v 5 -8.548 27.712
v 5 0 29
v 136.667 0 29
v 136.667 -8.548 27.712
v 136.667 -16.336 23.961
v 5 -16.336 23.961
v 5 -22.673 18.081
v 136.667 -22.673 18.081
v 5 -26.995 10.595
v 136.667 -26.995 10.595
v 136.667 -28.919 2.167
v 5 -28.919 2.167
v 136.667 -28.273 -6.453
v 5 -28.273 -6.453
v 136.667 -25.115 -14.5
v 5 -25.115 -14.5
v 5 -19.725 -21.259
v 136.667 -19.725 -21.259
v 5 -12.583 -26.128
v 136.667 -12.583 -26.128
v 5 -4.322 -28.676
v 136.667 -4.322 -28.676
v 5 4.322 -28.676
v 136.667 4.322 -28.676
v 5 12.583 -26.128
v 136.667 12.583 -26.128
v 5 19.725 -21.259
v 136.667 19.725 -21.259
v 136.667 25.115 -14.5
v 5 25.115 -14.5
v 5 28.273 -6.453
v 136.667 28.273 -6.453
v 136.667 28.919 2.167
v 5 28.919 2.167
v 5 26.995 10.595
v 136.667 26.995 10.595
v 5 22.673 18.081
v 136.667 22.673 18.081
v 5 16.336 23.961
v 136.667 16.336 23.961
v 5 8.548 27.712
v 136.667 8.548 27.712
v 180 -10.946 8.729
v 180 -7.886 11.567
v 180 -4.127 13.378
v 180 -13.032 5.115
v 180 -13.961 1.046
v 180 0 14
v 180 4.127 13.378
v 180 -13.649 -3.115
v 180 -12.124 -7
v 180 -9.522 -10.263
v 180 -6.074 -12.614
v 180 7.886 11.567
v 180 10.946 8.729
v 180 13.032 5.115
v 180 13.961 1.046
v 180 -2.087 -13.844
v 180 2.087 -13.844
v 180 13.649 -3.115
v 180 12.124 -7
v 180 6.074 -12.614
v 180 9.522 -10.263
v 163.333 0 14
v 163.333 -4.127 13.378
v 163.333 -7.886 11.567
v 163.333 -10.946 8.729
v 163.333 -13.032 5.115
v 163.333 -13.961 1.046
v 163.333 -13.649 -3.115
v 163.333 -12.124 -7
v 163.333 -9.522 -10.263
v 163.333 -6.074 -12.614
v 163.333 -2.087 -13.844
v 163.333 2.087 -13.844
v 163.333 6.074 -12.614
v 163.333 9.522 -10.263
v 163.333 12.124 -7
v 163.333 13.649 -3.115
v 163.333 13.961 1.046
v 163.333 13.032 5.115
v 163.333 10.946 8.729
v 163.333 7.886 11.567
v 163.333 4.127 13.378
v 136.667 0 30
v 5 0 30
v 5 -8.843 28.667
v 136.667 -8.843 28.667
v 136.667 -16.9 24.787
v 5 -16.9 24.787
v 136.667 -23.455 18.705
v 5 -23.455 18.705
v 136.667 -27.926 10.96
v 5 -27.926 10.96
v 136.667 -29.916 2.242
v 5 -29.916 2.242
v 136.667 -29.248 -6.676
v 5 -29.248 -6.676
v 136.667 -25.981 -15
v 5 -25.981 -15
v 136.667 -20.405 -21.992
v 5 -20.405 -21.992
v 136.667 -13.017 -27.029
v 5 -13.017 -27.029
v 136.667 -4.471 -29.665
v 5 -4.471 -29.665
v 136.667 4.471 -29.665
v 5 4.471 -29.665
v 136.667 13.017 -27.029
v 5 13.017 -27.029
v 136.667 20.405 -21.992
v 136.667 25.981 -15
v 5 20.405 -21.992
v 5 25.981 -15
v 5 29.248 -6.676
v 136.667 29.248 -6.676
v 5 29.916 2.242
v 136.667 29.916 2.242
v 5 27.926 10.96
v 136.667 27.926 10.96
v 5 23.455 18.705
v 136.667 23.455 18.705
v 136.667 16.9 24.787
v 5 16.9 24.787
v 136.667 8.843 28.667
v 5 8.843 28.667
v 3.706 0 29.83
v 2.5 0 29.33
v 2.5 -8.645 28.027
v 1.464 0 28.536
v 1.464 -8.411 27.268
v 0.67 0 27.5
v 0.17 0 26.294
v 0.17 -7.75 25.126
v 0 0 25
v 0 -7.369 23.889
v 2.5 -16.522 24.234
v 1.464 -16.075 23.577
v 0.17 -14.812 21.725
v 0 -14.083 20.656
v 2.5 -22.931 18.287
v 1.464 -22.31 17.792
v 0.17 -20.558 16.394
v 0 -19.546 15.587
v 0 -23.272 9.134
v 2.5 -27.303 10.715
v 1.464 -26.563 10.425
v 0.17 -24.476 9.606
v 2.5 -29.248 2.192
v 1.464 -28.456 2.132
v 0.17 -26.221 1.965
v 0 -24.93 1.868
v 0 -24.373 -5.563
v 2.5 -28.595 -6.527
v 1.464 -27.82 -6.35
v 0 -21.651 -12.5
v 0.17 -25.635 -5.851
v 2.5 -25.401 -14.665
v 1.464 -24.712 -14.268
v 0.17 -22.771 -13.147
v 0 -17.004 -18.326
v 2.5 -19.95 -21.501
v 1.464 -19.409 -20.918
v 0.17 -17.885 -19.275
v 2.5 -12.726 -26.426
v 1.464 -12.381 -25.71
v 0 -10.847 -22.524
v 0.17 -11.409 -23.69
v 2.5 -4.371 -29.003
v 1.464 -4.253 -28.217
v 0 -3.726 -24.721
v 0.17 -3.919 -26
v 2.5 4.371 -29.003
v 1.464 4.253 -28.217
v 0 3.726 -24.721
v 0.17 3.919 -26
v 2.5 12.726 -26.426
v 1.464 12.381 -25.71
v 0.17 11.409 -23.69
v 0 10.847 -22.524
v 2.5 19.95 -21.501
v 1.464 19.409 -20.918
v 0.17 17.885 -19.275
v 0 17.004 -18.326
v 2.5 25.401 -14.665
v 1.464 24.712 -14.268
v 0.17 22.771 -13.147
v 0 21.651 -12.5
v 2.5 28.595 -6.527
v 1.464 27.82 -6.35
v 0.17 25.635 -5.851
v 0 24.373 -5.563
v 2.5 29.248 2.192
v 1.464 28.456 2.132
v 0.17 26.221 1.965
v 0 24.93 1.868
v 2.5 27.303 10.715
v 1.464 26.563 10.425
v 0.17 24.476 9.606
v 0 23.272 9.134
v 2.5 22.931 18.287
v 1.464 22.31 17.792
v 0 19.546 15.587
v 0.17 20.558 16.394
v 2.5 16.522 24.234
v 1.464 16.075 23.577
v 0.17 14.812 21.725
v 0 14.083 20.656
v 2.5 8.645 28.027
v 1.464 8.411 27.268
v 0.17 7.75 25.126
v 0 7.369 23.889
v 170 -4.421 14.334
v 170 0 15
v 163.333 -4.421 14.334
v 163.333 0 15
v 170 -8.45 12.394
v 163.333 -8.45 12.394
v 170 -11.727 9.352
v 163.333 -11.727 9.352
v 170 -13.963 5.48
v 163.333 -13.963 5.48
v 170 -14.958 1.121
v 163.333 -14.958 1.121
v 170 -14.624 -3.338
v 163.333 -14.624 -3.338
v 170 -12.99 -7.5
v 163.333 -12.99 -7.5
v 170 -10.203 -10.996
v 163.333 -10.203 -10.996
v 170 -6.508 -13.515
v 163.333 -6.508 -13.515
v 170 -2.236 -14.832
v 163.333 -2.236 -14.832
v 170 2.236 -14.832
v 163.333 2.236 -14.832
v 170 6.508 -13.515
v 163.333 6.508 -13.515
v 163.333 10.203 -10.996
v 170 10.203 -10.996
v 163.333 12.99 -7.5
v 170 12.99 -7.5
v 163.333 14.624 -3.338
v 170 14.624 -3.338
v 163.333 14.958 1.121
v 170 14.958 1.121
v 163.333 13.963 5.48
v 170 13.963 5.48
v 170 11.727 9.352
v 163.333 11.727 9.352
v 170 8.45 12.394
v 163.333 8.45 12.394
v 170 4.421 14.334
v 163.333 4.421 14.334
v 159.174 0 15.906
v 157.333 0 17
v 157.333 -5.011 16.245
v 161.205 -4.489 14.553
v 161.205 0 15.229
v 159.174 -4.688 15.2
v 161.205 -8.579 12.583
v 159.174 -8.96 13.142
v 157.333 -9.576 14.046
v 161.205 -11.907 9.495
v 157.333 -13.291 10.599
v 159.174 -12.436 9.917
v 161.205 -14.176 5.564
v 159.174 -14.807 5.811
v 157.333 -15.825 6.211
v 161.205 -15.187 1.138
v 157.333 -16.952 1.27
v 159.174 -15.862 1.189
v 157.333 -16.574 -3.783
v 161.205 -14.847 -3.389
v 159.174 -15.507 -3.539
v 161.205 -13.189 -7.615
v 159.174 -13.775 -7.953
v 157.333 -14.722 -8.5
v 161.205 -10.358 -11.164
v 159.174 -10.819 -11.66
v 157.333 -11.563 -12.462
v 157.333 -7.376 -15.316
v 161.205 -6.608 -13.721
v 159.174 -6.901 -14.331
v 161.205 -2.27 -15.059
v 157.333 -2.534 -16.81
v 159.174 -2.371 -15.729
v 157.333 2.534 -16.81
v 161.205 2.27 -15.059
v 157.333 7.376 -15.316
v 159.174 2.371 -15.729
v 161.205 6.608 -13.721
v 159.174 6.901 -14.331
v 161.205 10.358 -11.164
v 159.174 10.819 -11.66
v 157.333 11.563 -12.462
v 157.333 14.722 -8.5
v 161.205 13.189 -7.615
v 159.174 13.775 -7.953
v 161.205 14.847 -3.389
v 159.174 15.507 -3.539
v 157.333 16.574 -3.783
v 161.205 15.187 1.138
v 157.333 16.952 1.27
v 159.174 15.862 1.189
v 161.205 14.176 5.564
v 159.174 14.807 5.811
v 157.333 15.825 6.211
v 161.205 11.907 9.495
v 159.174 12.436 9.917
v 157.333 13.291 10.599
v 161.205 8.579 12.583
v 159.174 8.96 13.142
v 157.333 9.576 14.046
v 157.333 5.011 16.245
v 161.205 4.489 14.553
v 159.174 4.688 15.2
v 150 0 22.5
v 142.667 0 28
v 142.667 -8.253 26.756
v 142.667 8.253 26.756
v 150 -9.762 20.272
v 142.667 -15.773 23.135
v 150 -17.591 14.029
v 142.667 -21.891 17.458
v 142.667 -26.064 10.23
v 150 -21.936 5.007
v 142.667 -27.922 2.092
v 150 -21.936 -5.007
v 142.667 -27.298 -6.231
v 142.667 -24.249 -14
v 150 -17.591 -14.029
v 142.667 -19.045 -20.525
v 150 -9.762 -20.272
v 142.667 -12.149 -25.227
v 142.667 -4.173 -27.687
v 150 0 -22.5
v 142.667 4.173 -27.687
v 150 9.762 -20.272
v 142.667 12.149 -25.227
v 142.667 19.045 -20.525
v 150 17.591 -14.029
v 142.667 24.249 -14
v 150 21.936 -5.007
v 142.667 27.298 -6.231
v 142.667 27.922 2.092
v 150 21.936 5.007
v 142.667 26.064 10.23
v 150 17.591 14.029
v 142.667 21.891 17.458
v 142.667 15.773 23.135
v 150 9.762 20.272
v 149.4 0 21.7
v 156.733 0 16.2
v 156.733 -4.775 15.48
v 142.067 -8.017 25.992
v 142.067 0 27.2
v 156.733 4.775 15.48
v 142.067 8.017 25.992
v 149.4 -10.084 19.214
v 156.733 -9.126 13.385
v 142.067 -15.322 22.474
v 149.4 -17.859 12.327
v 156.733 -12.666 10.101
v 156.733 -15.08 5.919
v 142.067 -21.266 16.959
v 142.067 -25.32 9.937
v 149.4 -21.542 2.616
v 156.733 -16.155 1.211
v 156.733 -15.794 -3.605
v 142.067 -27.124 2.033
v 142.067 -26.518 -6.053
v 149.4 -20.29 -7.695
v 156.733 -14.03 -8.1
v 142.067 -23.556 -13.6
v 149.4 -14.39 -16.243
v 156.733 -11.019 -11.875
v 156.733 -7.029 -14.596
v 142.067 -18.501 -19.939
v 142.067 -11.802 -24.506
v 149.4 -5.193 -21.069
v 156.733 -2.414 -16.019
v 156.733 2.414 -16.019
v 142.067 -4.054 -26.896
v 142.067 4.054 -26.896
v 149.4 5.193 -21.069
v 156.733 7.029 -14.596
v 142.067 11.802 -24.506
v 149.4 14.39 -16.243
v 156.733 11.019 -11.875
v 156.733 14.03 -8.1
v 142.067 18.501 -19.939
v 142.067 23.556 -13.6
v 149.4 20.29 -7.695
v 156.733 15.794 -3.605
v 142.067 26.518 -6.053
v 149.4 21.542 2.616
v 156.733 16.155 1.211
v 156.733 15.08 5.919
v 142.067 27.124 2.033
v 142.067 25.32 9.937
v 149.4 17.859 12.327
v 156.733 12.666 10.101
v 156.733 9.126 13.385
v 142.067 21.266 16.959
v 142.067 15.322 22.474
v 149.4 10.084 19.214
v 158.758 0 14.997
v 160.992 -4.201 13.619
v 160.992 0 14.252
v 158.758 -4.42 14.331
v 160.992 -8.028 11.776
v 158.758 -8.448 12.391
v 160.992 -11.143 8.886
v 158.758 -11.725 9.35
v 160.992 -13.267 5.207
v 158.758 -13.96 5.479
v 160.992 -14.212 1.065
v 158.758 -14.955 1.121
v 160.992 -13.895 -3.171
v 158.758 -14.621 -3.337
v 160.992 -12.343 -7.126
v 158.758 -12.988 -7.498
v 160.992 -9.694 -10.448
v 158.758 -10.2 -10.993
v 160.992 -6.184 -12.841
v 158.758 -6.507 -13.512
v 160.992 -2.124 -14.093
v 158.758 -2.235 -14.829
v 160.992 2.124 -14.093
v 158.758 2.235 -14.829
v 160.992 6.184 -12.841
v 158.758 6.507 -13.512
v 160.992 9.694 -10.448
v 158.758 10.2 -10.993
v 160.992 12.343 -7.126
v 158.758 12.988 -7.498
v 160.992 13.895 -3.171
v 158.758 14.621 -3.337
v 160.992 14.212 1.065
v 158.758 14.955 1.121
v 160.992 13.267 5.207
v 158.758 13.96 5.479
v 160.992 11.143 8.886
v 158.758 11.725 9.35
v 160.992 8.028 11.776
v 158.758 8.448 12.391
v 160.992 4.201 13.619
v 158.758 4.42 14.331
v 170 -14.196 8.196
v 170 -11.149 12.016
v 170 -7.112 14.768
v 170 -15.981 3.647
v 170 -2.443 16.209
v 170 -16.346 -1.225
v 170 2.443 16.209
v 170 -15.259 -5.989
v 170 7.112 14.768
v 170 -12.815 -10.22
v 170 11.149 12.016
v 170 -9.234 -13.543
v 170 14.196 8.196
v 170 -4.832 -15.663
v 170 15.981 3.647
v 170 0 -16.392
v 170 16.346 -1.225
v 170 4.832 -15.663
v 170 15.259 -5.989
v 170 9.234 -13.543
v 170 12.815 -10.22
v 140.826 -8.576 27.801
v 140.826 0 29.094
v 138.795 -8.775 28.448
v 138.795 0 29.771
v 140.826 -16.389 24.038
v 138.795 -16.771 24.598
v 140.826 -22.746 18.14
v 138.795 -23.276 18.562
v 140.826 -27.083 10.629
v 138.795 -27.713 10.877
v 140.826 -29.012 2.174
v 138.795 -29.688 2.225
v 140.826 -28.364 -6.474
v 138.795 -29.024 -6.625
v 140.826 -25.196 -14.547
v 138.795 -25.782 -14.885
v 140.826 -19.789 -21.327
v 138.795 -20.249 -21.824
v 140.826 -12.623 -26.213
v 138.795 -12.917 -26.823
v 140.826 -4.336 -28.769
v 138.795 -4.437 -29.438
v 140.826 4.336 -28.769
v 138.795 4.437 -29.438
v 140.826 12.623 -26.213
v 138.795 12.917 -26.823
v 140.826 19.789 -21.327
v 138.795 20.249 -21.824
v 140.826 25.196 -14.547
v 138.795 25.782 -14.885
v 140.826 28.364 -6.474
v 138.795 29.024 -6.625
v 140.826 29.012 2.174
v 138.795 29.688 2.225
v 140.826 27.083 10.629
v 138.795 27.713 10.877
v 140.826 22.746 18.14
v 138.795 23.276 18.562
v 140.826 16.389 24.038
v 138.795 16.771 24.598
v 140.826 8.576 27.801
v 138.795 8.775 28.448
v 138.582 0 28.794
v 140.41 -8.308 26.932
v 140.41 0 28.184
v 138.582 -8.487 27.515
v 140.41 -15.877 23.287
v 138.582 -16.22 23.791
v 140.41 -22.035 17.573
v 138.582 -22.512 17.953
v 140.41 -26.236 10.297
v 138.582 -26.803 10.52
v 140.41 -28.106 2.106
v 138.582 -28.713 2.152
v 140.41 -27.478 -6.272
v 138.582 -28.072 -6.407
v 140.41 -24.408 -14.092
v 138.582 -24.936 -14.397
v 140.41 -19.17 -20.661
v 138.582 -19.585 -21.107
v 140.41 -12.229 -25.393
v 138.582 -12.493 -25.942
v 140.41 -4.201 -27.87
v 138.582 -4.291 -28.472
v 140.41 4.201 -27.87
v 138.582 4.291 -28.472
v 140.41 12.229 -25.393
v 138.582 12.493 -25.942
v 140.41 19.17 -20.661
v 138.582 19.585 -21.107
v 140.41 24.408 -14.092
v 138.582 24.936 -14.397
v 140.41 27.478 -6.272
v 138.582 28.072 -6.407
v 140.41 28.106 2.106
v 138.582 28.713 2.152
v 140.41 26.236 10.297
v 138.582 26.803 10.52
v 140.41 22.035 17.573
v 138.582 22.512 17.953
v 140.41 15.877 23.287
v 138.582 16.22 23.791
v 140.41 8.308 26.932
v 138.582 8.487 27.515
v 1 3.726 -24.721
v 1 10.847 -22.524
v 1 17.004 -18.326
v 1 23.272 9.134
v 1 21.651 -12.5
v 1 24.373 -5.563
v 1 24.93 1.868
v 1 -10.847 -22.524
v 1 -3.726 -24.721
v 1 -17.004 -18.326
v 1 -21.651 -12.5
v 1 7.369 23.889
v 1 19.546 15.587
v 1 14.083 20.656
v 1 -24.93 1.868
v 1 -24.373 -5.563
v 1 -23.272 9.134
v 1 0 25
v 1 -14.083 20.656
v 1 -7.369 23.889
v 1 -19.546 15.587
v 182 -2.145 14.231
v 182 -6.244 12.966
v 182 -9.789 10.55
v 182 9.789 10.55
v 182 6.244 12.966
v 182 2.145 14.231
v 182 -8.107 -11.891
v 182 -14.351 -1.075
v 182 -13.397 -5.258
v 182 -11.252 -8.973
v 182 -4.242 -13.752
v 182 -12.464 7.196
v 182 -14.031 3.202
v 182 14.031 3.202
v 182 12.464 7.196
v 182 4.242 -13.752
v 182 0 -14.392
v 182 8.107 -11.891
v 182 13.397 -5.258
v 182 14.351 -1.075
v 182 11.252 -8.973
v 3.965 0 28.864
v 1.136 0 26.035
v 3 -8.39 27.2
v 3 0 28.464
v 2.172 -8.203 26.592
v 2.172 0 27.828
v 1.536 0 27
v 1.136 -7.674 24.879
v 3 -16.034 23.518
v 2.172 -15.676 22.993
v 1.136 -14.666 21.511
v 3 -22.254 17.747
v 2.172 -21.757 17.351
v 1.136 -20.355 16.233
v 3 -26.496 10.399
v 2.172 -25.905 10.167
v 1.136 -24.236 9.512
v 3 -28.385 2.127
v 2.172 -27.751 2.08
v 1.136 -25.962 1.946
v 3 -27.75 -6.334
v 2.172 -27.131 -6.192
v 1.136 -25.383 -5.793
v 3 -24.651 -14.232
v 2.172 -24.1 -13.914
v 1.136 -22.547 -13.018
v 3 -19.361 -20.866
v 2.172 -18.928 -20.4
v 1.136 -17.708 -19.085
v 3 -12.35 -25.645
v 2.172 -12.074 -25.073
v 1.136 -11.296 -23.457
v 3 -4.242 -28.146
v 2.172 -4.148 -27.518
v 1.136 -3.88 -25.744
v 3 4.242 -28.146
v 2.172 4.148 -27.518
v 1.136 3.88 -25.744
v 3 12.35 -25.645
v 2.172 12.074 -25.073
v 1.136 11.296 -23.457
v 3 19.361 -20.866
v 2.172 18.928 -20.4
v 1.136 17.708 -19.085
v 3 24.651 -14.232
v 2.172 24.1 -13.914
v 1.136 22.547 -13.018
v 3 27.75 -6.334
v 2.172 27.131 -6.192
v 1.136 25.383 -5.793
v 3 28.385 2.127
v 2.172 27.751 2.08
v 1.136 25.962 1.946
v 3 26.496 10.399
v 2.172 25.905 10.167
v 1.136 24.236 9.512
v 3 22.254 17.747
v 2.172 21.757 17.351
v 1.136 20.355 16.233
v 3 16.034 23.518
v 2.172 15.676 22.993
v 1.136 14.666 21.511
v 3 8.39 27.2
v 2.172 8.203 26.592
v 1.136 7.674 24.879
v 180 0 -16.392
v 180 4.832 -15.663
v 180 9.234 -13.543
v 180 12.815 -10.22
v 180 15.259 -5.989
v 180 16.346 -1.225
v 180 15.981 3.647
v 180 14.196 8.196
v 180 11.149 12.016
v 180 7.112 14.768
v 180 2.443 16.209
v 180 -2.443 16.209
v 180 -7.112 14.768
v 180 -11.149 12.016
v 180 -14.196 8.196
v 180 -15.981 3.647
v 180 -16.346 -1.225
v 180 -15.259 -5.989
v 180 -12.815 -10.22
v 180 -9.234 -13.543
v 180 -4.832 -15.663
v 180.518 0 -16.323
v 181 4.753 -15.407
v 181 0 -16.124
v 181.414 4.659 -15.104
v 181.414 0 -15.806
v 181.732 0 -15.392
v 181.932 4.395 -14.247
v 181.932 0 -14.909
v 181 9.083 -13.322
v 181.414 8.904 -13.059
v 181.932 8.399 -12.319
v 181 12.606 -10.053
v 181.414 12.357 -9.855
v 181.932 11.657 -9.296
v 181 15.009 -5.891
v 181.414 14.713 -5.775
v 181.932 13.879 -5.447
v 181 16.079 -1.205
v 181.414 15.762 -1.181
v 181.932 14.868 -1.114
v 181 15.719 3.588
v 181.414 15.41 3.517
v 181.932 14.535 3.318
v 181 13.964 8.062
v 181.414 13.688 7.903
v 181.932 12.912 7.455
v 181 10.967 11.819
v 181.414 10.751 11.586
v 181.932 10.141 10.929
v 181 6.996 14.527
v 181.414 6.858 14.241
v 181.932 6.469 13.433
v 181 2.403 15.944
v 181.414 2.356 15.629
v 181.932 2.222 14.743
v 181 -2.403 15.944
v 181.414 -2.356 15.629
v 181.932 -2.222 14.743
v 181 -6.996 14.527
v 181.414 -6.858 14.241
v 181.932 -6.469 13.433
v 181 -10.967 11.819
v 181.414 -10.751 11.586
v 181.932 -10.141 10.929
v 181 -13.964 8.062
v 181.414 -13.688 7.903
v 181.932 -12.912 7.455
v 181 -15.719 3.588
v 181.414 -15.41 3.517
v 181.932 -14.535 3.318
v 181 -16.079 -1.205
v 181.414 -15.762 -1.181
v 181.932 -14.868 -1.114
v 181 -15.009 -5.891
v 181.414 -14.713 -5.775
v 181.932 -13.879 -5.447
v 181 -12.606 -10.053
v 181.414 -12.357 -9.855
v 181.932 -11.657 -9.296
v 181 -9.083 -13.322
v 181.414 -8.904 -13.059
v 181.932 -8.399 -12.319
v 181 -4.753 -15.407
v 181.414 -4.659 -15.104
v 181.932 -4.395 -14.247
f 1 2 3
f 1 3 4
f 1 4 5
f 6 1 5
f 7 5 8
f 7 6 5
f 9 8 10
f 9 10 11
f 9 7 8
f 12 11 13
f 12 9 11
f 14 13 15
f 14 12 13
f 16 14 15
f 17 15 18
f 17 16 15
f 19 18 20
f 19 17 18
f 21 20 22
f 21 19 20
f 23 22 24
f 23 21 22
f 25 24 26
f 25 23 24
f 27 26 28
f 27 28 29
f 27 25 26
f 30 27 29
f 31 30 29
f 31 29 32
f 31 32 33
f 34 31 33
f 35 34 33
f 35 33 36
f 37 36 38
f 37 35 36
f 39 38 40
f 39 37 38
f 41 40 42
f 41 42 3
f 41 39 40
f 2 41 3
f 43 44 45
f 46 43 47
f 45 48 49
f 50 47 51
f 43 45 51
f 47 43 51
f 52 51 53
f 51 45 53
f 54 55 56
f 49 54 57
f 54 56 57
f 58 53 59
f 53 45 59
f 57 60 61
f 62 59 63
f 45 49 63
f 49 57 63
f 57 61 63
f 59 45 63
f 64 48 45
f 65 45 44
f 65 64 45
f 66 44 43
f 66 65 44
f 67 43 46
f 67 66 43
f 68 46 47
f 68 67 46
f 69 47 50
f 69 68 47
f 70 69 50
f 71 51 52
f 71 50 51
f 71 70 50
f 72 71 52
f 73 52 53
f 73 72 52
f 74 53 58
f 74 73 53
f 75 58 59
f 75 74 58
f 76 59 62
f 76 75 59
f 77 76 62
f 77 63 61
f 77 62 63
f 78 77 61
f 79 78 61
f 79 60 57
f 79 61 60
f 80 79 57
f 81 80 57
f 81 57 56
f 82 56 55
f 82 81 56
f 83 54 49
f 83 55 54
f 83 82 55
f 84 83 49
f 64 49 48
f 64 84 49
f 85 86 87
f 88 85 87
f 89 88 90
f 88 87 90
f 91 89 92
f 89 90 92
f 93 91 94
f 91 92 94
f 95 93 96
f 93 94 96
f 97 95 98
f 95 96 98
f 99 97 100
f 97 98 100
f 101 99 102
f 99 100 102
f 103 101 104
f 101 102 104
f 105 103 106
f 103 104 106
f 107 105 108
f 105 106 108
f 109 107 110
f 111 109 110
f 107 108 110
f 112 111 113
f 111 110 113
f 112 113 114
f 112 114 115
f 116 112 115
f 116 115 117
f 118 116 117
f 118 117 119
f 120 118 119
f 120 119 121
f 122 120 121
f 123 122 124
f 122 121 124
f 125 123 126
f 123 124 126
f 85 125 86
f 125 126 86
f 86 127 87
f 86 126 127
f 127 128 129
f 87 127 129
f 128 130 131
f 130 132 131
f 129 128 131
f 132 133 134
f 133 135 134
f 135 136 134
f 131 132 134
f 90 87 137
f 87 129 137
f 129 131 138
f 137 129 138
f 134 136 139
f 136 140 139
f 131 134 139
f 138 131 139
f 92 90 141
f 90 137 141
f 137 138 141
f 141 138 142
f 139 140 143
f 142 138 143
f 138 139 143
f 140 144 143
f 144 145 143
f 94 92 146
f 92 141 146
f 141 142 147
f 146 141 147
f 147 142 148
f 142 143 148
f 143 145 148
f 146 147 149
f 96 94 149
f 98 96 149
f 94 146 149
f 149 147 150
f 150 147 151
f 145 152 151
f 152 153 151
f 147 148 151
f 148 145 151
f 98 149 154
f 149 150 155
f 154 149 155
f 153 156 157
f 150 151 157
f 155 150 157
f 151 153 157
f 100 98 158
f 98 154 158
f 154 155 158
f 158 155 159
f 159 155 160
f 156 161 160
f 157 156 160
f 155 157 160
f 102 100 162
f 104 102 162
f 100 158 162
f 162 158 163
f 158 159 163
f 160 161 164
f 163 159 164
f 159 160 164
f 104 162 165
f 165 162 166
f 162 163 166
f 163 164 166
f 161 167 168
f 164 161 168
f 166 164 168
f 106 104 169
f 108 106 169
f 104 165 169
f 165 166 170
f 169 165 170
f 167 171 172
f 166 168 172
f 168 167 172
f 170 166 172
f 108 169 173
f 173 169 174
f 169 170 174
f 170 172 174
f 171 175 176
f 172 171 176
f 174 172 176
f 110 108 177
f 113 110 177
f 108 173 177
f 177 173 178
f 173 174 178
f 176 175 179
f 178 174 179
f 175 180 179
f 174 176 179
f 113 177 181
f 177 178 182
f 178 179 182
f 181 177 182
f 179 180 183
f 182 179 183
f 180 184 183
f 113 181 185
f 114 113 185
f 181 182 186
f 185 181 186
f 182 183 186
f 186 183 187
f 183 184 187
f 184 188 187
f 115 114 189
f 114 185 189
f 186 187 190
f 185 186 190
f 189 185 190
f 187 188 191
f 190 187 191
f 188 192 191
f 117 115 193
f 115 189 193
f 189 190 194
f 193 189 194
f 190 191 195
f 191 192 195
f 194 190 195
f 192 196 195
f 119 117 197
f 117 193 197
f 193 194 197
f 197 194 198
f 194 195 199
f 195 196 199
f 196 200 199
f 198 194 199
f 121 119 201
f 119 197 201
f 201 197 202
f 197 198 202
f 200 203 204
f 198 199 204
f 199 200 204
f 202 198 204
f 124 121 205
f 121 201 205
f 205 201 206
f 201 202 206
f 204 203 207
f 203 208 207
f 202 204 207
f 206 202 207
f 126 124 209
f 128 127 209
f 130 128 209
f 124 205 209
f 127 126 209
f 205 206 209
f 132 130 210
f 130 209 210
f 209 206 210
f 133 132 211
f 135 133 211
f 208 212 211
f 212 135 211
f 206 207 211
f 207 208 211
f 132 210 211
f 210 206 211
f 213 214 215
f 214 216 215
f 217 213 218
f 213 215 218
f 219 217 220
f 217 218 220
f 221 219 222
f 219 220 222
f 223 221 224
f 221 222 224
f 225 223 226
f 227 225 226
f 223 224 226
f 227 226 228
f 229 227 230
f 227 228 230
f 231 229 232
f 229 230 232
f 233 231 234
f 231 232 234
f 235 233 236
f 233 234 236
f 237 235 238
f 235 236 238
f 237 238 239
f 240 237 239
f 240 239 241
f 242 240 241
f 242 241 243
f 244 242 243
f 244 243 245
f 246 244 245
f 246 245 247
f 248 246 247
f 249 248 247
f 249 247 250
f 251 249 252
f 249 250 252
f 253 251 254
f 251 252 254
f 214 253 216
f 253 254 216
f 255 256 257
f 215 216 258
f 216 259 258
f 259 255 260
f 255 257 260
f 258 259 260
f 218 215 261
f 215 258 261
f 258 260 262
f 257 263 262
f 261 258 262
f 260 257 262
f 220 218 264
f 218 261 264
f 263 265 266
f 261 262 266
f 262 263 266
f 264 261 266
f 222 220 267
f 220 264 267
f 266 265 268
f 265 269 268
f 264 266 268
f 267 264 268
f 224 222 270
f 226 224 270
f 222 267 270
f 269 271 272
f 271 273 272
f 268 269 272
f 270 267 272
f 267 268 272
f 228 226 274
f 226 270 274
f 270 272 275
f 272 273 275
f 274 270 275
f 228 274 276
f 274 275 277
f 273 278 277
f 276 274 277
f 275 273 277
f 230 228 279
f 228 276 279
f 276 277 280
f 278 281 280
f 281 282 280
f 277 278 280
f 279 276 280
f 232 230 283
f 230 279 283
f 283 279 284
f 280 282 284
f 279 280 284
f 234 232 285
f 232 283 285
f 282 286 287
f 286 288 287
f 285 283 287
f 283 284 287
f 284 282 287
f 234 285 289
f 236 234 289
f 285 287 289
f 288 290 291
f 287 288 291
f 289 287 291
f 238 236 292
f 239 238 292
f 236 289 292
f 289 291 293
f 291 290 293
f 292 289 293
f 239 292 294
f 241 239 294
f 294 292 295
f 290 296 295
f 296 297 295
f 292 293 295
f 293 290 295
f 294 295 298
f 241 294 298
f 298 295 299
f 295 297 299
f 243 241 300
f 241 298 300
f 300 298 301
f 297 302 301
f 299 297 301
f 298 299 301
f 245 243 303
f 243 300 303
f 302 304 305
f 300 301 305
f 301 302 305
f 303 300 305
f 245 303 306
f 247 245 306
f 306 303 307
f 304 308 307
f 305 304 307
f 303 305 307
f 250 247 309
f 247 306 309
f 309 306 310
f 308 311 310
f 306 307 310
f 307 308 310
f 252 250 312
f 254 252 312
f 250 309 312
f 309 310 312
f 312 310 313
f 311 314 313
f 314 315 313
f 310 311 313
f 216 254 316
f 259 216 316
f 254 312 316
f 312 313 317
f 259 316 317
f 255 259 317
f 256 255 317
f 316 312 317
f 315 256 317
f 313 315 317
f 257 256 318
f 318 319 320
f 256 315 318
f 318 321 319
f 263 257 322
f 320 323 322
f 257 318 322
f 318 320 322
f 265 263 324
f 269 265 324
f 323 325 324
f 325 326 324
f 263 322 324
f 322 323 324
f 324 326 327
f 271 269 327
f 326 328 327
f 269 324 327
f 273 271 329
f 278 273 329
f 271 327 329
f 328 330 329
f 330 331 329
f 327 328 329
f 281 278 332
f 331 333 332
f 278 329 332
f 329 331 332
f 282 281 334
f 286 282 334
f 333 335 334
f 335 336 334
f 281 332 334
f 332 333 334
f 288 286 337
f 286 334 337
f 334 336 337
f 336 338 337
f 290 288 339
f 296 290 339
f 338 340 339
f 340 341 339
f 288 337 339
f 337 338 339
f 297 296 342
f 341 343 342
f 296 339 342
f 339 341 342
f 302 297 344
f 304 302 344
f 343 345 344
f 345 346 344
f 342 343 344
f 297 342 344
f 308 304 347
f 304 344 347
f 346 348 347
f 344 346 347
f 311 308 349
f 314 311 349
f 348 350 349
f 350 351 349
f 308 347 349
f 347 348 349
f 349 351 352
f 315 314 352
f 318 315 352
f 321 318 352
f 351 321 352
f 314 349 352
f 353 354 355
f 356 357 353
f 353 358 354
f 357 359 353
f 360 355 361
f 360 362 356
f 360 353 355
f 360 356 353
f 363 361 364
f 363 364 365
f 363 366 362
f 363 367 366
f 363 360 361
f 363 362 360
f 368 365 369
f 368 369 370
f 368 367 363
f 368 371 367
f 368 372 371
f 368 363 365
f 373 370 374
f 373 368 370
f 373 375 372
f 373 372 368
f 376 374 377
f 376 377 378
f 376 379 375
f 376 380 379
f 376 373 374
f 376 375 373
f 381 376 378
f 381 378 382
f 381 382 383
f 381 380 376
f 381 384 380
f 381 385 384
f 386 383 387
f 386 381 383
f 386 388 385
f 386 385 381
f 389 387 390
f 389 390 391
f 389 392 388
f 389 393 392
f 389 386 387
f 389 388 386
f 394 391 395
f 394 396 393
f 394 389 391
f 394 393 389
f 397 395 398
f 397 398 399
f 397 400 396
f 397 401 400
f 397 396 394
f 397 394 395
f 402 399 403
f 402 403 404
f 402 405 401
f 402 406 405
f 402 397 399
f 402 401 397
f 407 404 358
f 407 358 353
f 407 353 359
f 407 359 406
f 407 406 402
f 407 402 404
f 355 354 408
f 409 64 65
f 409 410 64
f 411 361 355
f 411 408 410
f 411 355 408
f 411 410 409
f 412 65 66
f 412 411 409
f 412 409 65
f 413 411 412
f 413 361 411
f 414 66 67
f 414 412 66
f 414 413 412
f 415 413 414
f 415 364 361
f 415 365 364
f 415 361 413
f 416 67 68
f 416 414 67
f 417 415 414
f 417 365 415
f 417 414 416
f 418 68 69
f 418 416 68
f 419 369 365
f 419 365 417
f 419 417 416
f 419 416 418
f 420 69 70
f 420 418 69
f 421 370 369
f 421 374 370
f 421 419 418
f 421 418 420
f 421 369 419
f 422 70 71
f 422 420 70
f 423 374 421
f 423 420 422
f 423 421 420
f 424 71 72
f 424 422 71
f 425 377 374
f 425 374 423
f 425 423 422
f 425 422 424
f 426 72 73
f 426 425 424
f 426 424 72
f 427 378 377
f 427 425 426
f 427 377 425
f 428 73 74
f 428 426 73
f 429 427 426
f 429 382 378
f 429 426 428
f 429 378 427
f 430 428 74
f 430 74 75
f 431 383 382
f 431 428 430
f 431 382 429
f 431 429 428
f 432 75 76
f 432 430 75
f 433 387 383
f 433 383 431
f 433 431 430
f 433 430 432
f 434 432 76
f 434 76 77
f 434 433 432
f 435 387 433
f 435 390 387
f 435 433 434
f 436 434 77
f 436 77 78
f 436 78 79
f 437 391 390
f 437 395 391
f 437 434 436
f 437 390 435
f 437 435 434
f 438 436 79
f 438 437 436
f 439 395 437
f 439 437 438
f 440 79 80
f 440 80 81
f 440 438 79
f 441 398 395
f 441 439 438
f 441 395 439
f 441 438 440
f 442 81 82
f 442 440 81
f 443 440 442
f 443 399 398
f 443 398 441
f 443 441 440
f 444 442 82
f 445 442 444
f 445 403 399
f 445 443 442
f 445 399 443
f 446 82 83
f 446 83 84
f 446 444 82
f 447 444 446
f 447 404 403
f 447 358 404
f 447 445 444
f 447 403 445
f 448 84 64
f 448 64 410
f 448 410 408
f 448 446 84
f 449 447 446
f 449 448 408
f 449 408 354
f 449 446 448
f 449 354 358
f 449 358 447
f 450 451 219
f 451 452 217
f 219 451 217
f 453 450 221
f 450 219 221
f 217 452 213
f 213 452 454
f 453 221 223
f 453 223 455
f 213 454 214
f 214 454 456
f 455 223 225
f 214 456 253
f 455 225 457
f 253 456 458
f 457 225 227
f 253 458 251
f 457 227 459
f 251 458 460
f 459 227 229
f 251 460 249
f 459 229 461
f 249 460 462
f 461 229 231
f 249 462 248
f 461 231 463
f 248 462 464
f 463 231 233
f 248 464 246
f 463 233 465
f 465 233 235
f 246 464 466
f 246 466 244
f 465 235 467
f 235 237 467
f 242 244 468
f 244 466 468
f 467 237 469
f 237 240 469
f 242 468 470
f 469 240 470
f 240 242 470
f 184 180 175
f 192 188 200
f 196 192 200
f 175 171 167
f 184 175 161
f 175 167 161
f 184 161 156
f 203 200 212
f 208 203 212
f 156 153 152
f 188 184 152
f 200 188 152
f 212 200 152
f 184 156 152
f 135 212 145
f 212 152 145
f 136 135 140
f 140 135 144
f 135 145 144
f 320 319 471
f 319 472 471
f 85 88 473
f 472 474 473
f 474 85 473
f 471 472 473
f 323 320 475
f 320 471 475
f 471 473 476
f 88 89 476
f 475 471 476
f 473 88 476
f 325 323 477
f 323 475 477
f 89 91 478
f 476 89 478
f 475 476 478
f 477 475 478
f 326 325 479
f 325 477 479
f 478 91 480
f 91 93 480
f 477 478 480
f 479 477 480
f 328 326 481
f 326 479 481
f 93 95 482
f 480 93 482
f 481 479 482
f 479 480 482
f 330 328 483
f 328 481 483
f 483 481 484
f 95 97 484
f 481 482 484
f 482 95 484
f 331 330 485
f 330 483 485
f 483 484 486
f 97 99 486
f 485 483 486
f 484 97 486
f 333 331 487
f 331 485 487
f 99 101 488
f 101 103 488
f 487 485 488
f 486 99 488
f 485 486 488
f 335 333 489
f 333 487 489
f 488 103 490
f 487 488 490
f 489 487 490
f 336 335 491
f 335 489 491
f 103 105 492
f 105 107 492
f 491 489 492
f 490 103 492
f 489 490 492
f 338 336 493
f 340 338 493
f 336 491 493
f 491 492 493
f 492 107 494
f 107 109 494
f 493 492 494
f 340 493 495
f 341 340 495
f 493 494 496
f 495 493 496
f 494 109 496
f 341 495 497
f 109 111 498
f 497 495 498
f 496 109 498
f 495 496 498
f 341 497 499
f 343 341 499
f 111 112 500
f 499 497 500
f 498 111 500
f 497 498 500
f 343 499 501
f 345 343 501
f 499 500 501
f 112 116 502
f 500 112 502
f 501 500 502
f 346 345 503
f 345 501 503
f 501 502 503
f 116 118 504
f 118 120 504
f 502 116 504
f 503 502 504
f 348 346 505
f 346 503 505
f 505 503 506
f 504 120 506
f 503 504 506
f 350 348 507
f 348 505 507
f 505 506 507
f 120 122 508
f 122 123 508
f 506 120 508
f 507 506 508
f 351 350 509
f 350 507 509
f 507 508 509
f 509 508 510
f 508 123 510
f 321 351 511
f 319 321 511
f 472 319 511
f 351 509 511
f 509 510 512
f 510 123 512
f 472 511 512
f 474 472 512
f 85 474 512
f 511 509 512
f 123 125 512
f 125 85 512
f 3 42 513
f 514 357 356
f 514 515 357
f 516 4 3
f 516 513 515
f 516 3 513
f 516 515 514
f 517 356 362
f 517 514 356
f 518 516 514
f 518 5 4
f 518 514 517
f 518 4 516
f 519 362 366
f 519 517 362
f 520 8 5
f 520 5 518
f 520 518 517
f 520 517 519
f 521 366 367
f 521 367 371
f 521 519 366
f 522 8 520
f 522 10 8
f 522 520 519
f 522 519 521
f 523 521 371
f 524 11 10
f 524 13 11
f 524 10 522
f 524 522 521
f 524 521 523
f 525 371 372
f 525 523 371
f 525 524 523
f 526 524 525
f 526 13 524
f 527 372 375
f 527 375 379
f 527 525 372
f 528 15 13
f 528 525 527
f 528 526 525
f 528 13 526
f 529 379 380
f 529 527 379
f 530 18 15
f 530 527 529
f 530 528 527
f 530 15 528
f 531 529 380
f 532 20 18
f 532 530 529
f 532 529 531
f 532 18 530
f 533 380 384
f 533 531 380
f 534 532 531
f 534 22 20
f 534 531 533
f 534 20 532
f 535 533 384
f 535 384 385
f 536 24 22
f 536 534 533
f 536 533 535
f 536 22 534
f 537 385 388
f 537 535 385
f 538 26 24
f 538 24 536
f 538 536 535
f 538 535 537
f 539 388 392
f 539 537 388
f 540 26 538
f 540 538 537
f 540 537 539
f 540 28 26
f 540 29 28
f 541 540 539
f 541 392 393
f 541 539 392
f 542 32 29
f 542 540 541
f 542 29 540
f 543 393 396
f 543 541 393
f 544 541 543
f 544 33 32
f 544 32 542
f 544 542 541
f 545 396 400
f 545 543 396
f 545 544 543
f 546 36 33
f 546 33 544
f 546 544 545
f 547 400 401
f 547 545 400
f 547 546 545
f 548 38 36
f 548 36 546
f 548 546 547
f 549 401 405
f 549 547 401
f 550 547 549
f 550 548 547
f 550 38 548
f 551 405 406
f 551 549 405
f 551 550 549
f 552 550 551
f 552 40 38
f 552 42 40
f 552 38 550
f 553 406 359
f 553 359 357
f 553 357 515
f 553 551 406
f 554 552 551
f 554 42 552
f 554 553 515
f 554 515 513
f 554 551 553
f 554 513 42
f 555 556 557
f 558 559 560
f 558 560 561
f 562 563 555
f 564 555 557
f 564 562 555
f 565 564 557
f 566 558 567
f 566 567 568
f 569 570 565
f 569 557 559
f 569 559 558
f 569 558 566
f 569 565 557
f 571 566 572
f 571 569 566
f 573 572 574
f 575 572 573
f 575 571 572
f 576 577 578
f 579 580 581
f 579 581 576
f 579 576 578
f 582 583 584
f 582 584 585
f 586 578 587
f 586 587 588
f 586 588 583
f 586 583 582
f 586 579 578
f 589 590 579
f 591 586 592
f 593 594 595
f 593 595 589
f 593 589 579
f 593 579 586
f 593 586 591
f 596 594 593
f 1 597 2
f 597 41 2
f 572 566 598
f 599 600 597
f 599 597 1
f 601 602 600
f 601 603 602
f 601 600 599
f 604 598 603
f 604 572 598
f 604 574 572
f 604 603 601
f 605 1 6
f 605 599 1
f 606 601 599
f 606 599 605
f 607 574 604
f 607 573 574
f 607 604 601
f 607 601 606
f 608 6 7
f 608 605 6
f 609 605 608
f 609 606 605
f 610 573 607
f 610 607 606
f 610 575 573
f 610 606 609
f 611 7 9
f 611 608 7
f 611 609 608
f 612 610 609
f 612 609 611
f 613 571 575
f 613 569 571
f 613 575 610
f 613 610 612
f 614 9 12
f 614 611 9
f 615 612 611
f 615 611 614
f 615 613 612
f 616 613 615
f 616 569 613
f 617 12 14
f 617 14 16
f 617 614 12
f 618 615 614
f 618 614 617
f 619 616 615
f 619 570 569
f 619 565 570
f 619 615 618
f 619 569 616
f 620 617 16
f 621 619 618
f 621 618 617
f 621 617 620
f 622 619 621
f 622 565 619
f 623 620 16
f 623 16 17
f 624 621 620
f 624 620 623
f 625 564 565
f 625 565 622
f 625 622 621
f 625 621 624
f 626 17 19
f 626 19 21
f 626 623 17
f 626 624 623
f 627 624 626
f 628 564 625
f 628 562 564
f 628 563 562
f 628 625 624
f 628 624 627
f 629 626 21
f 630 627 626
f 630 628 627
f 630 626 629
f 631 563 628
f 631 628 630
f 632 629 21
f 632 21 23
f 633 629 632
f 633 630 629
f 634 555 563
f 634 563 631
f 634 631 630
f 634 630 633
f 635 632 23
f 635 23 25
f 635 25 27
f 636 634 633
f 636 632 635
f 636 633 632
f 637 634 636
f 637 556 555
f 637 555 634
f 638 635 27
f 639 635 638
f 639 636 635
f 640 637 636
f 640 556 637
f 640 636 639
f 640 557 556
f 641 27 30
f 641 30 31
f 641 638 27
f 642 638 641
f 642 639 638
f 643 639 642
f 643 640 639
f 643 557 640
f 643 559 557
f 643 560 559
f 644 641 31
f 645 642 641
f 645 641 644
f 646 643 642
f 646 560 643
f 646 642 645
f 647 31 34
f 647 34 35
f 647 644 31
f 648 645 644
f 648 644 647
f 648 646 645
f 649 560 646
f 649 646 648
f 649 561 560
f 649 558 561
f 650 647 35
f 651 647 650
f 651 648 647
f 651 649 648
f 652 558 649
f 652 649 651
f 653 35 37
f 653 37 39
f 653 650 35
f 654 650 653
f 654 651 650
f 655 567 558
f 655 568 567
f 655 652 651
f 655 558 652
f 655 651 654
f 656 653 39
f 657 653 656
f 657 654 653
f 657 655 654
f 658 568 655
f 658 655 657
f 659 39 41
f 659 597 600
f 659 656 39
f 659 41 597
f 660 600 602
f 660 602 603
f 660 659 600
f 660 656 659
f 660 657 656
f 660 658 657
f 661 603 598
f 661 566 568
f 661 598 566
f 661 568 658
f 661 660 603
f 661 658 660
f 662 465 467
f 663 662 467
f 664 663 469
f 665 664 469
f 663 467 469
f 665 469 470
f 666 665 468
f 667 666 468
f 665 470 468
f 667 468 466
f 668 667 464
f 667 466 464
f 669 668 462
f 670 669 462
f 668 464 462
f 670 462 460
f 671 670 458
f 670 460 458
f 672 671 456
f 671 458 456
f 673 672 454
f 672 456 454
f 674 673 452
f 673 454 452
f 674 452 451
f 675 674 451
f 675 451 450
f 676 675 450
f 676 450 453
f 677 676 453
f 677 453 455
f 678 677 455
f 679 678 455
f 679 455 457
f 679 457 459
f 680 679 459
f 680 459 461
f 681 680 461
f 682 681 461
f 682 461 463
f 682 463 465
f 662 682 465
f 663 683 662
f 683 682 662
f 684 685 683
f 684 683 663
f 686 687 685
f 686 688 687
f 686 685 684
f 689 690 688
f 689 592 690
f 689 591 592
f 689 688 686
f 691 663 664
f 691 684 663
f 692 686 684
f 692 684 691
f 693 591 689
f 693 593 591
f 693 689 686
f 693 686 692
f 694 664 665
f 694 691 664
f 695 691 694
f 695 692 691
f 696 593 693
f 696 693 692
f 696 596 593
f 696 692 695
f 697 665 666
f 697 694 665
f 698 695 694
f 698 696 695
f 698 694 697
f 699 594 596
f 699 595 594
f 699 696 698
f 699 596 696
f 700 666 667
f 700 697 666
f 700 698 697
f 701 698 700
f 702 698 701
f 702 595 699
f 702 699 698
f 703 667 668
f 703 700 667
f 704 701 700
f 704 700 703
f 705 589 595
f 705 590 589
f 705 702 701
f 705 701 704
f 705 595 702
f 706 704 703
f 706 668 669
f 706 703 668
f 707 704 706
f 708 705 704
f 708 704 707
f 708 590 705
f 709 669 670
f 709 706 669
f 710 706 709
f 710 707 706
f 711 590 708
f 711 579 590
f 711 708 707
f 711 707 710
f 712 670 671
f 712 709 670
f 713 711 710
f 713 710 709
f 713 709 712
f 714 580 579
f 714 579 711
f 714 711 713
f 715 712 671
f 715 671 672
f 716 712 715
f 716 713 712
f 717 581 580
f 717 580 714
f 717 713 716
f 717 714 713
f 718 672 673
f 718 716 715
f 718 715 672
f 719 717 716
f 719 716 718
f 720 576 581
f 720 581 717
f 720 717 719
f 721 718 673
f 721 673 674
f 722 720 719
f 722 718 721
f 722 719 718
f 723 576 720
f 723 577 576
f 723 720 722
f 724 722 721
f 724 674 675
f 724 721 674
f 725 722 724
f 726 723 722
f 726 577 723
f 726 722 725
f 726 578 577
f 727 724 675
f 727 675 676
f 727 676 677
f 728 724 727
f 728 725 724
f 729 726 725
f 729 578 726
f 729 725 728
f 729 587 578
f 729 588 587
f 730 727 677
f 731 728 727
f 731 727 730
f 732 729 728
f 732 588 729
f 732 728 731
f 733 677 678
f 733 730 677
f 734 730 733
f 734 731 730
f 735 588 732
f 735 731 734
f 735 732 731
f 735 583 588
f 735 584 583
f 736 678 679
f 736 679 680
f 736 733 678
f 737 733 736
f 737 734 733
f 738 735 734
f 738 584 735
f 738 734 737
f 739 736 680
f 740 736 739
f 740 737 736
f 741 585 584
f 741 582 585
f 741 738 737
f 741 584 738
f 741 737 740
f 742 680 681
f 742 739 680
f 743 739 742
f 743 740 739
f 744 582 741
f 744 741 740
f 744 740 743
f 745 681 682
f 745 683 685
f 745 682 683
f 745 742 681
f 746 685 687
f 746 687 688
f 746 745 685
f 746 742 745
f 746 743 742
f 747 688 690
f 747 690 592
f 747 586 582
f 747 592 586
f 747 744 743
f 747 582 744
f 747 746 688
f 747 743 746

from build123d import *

# Parameters (mm, degrees)
FILLET_1_R      = 5
SHELL_1_T       = -1
EXTRUDE_START   = -10
SKETCH_2_R      = 16.391613339
SKETCH_2_R_2    = 15
EXTRUDE_1_DEPTH = 10
SKETCH_3_R      = 16.391613339
EXTRUDE_2_DEPTH = 2
FILLET_2_R      = 2


with BuildPart() as part:
    # 草图1 → 旋转1 (revolve)
    with BuildSketch(Plane.XY, mode=Mode.PRIVATE) as revolve_1_sk:
        with BuildLine():
            Line((180, 15), (163.333333333, 15))
            ThreePointArc((163.333333333, 15), (160.171055673, 15.513167019), (157.333333333, 17))
            Line((157.333333333, 17), (142.666666667, 28))
            ThreePointArc((142.666666667, 28), (139.828944327, 29.486832981), (136.666666667, 30))
            Line((136.666666667, 30), (0, 30))
            Line((0, 30), (0, 0))
            Line((0, 0), (180, 0))
            Line((180, 0), (180, 15))
        make_face()
    revolve(revolve_1_sk.sketch.rotate(Axis((0, 0, 0), (1, 0, 0)), 90), axis=Axis((0, 0, 0), (1, 0, 0)))

    # 圆角1
    fillet_1_edges = [part.edges().sort_by_distance(p)[0] for p in [
        (0, 0, -30),
    ]]
    fillet(fillet_1_edges, radius=FILLET_1_R)

    # 抽壳1
    shell_1_openings = [part.faces().sort_by_distance(p)[0] for p in [
        (180, 0, 0),
    ]]
    offset(amount=SHELL_1_T, openings=shell_1_openings, kind=Kind.INTERSECTION)

    # 草图2 → 凸台-拉伸1 (add)
    with BuildSketch(Plane(origin=(180, 0, 0), x_dir=(0, 0, -1), z_dir=(1, 0, 0)).offset(EXTRUDE_START)):
        Circle(SKETCH_2_R)
        with Locations(Location((0, 0, 0), (0, 0, 180))):
            Circle(SKETCH_2_R_2, mode=Mode.SUBTRACT)
    extrude(amount=EXTRUDE_1_DEPTH)

    # 草图3 → 凸台-拉伸2 (add)
    with BuildSketch(Plane(origin=(180, 0, 0), x_dir=(0, 0, -1), z_dir=(1, 0, 0))):
        Circle(SKETCH_3_R)
    extrude(amount=EXTRUDE_2_DEPTH)

    # 圆角2
    fillet_2_edges = [part.edges().sort_by_distance(p)[0] for p in [
        (182, 0, 16.391613339),
    ]]
    fillet(fillet_2_edges, radius=FILLET_2_R)


solid = part.part
